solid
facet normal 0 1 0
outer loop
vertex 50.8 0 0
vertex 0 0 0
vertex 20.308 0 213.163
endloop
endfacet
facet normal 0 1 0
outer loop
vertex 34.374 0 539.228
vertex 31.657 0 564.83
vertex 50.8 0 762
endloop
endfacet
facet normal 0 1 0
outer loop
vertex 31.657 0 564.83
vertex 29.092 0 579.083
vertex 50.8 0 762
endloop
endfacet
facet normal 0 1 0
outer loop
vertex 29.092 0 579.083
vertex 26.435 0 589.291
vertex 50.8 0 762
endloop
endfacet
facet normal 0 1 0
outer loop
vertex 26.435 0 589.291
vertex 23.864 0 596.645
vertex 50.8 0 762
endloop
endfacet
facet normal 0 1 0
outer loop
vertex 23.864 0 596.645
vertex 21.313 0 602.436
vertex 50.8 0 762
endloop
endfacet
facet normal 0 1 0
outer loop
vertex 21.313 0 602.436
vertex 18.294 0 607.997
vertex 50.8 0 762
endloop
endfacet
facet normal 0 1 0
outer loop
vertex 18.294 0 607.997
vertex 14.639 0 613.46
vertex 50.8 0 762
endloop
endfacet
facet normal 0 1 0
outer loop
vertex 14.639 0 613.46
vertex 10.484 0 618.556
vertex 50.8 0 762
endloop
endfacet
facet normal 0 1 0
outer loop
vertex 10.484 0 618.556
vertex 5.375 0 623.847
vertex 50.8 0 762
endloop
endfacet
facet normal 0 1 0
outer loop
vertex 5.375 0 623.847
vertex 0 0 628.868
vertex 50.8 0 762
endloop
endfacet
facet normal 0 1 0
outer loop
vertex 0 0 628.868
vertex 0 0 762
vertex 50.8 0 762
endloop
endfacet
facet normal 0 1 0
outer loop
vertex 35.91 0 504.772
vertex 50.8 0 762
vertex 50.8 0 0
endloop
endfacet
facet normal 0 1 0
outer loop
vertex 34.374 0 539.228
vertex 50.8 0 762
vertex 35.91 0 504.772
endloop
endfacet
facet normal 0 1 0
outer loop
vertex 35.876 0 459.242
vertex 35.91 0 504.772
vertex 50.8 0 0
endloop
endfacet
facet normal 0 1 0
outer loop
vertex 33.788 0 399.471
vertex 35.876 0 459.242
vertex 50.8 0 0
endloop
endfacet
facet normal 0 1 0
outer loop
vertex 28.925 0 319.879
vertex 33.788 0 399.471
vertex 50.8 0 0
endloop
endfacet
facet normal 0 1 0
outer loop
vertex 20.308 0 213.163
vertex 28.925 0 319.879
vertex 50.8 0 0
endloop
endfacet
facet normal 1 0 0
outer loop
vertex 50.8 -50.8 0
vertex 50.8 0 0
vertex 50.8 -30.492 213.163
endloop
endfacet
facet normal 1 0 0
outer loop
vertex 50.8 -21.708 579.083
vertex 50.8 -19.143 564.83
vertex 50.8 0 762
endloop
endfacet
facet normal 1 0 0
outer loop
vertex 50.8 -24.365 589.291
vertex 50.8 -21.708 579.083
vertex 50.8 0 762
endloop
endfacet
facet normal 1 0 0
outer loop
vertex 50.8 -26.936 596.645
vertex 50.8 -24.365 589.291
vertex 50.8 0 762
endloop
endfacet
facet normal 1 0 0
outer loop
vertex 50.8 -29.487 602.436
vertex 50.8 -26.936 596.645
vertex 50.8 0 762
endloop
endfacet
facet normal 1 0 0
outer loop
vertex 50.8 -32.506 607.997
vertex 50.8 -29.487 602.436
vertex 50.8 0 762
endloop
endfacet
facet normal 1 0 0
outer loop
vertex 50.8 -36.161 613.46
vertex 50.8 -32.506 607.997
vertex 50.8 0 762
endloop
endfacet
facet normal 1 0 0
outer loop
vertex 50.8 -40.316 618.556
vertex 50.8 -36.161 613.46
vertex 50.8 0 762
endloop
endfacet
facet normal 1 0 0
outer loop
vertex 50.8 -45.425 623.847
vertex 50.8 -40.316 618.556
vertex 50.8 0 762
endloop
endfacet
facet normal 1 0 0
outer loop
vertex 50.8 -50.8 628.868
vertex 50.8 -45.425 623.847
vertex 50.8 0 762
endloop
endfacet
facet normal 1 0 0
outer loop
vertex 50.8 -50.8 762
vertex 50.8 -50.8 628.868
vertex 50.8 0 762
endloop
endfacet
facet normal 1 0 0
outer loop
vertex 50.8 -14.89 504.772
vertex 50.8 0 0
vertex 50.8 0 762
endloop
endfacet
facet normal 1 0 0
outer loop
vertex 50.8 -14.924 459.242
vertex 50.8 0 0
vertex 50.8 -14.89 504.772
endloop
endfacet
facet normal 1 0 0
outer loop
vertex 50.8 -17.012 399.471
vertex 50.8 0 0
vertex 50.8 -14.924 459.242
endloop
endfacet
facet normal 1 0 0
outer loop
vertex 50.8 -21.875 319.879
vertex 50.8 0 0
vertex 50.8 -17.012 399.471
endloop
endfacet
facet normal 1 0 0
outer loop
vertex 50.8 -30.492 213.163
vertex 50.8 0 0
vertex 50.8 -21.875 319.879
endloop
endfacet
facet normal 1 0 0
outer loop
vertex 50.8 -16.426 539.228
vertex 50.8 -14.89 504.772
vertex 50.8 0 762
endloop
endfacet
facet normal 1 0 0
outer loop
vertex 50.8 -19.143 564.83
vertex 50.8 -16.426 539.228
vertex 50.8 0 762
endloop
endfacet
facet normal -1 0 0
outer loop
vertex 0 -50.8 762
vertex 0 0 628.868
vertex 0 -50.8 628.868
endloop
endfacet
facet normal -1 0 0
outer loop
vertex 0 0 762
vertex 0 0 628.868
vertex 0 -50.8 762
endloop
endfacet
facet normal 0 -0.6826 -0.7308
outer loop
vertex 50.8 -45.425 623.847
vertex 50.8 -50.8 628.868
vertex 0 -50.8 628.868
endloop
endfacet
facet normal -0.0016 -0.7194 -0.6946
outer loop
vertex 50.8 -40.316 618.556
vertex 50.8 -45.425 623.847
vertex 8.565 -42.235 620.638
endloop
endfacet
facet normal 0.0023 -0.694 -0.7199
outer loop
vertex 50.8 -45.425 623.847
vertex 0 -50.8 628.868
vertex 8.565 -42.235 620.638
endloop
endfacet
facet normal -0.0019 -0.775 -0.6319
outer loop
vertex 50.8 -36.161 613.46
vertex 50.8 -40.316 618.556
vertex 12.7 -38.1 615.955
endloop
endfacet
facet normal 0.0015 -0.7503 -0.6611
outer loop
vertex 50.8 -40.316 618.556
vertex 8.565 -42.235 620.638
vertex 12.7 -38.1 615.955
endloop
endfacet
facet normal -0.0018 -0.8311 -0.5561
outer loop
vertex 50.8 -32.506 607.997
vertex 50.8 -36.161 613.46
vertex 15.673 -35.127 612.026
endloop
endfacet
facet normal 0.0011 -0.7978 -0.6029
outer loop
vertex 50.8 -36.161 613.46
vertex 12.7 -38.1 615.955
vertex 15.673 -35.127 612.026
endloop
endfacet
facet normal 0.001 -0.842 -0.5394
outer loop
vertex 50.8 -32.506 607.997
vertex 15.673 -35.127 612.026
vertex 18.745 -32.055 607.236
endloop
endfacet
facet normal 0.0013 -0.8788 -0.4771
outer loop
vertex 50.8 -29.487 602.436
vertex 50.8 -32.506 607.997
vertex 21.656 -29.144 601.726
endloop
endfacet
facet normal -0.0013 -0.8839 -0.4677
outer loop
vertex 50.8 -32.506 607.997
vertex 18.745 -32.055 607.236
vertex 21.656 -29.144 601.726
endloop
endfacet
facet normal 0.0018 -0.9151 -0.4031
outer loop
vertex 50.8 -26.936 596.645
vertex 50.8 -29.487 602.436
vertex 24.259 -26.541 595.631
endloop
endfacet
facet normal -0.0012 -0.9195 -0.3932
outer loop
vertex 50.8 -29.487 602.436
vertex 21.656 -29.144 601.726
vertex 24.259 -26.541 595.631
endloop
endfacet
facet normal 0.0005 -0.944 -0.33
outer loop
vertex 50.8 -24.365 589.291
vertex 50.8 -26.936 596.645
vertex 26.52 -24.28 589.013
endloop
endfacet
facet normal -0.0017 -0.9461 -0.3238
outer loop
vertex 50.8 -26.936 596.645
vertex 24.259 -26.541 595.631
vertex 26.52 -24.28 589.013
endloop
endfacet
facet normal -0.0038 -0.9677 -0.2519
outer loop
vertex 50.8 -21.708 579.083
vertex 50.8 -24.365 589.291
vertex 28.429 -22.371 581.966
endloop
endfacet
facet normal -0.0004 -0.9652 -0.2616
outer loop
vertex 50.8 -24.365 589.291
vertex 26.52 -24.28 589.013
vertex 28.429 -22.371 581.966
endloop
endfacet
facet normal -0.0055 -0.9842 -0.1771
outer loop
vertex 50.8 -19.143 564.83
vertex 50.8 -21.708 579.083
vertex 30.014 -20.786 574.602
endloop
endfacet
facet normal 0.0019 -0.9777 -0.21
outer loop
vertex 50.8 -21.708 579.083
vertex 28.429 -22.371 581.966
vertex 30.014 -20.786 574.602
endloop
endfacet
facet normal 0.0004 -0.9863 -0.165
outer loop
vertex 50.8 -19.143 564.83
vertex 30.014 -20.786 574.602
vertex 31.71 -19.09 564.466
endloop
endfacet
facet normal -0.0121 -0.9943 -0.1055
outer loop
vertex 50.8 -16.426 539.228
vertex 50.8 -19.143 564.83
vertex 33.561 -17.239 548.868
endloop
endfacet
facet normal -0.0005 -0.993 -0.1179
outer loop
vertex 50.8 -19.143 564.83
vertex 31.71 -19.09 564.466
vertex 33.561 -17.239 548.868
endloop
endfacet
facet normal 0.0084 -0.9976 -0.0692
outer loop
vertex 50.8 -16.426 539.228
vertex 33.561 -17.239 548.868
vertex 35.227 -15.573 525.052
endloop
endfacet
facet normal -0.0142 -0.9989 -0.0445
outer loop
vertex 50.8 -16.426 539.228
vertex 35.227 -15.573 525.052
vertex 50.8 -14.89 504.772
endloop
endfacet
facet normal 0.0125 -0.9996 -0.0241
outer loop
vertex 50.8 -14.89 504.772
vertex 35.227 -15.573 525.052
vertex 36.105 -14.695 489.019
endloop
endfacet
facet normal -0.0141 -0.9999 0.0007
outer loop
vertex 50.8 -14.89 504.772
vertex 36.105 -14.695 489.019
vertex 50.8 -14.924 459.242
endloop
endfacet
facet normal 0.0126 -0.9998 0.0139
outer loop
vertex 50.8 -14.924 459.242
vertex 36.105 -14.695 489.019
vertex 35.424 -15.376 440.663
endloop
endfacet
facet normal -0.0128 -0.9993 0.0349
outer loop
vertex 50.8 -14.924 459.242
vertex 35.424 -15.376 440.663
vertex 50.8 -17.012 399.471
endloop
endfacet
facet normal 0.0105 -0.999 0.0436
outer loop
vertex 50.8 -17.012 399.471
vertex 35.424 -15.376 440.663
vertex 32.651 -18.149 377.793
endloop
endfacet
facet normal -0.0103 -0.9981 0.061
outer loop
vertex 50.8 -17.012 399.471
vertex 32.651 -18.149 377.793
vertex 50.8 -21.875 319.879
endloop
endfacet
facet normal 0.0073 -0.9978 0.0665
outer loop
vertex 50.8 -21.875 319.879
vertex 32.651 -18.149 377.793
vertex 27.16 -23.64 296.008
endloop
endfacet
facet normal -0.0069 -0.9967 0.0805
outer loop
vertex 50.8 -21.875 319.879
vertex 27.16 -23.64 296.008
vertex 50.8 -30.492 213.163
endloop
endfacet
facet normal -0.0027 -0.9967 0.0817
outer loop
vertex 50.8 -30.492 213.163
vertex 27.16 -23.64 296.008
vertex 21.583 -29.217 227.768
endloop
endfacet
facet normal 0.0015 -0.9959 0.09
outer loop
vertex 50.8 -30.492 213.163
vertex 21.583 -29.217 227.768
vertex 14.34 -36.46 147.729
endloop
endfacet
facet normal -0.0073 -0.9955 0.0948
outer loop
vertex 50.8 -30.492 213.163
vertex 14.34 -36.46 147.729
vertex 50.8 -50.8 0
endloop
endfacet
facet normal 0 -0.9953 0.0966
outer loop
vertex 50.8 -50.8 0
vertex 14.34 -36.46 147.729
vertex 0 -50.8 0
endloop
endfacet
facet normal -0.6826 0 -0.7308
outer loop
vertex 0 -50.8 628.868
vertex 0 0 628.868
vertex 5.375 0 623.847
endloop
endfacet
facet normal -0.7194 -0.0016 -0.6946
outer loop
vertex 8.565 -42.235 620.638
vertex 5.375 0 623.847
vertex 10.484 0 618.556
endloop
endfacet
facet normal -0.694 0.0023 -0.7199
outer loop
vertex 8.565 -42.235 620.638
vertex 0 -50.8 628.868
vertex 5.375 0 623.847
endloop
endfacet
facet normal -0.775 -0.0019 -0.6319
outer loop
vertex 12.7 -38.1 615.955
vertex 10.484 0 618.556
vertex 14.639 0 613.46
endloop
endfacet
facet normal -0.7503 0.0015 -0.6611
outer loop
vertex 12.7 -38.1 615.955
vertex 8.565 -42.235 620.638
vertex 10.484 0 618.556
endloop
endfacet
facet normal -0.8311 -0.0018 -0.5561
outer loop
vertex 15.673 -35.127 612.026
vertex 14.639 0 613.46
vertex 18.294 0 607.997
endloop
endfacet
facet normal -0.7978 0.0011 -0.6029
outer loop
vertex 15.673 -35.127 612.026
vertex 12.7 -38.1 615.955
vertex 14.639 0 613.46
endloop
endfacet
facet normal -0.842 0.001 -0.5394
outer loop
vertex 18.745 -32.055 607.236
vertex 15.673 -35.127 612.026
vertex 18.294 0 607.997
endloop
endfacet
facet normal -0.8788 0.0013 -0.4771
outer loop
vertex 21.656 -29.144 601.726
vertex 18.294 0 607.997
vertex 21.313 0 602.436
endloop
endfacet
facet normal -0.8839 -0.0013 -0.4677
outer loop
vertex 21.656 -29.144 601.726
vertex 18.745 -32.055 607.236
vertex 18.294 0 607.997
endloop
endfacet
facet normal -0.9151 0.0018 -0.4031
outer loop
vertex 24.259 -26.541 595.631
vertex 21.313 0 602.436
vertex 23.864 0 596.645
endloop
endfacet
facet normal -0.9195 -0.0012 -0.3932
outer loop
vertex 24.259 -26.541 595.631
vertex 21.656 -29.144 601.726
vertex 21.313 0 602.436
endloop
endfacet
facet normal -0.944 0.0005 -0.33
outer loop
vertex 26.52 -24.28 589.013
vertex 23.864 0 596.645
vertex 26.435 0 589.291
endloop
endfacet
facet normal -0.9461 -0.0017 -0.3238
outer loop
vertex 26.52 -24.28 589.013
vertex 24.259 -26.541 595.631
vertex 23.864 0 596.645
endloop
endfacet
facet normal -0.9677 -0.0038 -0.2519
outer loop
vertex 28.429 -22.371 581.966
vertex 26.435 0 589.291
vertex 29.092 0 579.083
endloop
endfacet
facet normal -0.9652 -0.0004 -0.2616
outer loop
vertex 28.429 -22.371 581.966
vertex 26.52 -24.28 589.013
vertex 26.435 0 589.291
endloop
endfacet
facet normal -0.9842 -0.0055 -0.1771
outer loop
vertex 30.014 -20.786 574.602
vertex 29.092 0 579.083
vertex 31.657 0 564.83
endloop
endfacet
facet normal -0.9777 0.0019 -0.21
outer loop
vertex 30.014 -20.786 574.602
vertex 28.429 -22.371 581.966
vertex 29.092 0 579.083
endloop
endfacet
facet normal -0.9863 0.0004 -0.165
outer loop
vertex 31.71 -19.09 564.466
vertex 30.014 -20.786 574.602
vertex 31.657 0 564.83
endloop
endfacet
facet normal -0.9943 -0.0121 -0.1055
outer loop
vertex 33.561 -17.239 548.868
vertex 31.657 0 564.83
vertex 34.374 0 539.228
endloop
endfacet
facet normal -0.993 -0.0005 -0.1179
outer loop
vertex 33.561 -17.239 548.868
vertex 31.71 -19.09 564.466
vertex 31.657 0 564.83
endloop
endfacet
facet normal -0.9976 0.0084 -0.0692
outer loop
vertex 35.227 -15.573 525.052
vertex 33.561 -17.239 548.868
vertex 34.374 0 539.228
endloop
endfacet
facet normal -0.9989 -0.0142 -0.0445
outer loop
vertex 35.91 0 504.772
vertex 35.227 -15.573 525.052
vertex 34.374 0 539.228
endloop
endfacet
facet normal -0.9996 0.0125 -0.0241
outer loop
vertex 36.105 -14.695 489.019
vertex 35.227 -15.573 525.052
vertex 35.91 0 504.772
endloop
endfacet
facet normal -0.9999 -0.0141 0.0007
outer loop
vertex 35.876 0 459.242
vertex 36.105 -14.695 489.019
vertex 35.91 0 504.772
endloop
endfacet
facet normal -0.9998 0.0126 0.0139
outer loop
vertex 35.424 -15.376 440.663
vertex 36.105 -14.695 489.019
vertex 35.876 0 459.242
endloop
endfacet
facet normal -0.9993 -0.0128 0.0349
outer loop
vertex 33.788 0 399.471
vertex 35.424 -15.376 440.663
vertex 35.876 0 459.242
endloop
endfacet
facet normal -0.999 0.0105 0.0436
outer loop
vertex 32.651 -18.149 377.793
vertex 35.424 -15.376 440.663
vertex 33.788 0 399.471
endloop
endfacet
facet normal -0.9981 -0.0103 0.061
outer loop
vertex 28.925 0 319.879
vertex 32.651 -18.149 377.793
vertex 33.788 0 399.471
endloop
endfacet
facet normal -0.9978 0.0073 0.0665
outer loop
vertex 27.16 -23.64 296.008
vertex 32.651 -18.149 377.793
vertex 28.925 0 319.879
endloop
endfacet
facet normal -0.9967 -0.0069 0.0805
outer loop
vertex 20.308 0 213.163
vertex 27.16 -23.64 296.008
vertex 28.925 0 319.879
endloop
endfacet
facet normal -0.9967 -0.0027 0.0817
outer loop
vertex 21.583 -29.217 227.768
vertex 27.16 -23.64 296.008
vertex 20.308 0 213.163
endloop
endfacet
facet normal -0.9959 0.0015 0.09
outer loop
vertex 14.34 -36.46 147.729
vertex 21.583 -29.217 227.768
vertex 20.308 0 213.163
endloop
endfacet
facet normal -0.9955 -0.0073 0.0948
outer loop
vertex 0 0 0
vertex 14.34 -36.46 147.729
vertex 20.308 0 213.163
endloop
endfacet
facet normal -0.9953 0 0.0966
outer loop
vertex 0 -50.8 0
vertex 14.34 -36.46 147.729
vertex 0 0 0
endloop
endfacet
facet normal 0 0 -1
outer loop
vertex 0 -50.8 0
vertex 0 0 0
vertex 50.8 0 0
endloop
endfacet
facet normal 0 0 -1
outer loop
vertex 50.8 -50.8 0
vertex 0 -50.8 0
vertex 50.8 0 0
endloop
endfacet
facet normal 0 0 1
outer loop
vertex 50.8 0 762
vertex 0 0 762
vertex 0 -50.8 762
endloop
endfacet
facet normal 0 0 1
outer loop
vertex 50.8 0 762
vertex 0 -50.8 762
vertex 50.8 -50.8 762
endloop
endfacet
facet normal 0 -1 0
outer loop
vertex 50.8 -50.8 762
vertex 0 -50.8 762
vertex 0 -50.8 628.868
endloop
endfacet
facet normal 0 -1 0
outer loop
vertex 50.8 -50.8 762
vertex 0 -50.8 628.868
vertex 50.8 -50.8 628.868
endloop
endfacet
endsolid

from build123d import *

# Parameters (mm, degrees)
F0_W     = 50.8
F0_H     = 762
F1_DEPTH = 50.8
F3_DEPTH = 50.801
F5_DEPTH = 50.8010001


with BuildPart() as f1:
    # F0 (on Front) → F1 (new body)
    with BuildSketch(Plane.XZ):
        with Locations((25.4, 381)):
            Rectangle(F0_W, F0_H)
    extrude(amount=F1_DEPTH)

    # F2 (on face) → F3 (cut, through all)
    with BuildSketch(Plane(origin=(0, 0, 0), x_dir=(0, -1, 0), z_dir=(-1, 0, 0))):
        with BuildLine():
            Line((50.8, 0), (50.8, 628.8682222366))
            add(Edge.make_bspline(
                [(50.8, 628.8682222366), (40.1594034425, 619.1082818245), (-6.0850742502, 576.6911725737), (26.0551003957, 250.8595682805), (50.8, 0)],
                knots=[0, 0, 0, 0, 0.2300944262, 1, 1, 1, 1], degree=3))
        make_face()
    extrude(amount=-F3_DEPTH, mode=Mode.SUBTRACT)

    # F4 (on face) → F5 (cut, through all)
    with BuildSketch(Plane.XZ.offset(50.8)):
        with BuildLine():
            add(Edge.make_bspline(
                [(0, 628.8682222366), (10.6405965575, 619.1082818245), (56.8850742502, 576.6911725737), (24.7448996043, 250.8595682805), (0, 0)],
                knots=[0, 0, 0, 0, 0.2300944262, 1, 1, 1, 1], degree=3))
            Line((0, 628.8682222366), (0, 0))
        make_face()
    extrude(amount=-F5_DEPTH, mode=Mode.SUBTRACT)


solid = f1.part
